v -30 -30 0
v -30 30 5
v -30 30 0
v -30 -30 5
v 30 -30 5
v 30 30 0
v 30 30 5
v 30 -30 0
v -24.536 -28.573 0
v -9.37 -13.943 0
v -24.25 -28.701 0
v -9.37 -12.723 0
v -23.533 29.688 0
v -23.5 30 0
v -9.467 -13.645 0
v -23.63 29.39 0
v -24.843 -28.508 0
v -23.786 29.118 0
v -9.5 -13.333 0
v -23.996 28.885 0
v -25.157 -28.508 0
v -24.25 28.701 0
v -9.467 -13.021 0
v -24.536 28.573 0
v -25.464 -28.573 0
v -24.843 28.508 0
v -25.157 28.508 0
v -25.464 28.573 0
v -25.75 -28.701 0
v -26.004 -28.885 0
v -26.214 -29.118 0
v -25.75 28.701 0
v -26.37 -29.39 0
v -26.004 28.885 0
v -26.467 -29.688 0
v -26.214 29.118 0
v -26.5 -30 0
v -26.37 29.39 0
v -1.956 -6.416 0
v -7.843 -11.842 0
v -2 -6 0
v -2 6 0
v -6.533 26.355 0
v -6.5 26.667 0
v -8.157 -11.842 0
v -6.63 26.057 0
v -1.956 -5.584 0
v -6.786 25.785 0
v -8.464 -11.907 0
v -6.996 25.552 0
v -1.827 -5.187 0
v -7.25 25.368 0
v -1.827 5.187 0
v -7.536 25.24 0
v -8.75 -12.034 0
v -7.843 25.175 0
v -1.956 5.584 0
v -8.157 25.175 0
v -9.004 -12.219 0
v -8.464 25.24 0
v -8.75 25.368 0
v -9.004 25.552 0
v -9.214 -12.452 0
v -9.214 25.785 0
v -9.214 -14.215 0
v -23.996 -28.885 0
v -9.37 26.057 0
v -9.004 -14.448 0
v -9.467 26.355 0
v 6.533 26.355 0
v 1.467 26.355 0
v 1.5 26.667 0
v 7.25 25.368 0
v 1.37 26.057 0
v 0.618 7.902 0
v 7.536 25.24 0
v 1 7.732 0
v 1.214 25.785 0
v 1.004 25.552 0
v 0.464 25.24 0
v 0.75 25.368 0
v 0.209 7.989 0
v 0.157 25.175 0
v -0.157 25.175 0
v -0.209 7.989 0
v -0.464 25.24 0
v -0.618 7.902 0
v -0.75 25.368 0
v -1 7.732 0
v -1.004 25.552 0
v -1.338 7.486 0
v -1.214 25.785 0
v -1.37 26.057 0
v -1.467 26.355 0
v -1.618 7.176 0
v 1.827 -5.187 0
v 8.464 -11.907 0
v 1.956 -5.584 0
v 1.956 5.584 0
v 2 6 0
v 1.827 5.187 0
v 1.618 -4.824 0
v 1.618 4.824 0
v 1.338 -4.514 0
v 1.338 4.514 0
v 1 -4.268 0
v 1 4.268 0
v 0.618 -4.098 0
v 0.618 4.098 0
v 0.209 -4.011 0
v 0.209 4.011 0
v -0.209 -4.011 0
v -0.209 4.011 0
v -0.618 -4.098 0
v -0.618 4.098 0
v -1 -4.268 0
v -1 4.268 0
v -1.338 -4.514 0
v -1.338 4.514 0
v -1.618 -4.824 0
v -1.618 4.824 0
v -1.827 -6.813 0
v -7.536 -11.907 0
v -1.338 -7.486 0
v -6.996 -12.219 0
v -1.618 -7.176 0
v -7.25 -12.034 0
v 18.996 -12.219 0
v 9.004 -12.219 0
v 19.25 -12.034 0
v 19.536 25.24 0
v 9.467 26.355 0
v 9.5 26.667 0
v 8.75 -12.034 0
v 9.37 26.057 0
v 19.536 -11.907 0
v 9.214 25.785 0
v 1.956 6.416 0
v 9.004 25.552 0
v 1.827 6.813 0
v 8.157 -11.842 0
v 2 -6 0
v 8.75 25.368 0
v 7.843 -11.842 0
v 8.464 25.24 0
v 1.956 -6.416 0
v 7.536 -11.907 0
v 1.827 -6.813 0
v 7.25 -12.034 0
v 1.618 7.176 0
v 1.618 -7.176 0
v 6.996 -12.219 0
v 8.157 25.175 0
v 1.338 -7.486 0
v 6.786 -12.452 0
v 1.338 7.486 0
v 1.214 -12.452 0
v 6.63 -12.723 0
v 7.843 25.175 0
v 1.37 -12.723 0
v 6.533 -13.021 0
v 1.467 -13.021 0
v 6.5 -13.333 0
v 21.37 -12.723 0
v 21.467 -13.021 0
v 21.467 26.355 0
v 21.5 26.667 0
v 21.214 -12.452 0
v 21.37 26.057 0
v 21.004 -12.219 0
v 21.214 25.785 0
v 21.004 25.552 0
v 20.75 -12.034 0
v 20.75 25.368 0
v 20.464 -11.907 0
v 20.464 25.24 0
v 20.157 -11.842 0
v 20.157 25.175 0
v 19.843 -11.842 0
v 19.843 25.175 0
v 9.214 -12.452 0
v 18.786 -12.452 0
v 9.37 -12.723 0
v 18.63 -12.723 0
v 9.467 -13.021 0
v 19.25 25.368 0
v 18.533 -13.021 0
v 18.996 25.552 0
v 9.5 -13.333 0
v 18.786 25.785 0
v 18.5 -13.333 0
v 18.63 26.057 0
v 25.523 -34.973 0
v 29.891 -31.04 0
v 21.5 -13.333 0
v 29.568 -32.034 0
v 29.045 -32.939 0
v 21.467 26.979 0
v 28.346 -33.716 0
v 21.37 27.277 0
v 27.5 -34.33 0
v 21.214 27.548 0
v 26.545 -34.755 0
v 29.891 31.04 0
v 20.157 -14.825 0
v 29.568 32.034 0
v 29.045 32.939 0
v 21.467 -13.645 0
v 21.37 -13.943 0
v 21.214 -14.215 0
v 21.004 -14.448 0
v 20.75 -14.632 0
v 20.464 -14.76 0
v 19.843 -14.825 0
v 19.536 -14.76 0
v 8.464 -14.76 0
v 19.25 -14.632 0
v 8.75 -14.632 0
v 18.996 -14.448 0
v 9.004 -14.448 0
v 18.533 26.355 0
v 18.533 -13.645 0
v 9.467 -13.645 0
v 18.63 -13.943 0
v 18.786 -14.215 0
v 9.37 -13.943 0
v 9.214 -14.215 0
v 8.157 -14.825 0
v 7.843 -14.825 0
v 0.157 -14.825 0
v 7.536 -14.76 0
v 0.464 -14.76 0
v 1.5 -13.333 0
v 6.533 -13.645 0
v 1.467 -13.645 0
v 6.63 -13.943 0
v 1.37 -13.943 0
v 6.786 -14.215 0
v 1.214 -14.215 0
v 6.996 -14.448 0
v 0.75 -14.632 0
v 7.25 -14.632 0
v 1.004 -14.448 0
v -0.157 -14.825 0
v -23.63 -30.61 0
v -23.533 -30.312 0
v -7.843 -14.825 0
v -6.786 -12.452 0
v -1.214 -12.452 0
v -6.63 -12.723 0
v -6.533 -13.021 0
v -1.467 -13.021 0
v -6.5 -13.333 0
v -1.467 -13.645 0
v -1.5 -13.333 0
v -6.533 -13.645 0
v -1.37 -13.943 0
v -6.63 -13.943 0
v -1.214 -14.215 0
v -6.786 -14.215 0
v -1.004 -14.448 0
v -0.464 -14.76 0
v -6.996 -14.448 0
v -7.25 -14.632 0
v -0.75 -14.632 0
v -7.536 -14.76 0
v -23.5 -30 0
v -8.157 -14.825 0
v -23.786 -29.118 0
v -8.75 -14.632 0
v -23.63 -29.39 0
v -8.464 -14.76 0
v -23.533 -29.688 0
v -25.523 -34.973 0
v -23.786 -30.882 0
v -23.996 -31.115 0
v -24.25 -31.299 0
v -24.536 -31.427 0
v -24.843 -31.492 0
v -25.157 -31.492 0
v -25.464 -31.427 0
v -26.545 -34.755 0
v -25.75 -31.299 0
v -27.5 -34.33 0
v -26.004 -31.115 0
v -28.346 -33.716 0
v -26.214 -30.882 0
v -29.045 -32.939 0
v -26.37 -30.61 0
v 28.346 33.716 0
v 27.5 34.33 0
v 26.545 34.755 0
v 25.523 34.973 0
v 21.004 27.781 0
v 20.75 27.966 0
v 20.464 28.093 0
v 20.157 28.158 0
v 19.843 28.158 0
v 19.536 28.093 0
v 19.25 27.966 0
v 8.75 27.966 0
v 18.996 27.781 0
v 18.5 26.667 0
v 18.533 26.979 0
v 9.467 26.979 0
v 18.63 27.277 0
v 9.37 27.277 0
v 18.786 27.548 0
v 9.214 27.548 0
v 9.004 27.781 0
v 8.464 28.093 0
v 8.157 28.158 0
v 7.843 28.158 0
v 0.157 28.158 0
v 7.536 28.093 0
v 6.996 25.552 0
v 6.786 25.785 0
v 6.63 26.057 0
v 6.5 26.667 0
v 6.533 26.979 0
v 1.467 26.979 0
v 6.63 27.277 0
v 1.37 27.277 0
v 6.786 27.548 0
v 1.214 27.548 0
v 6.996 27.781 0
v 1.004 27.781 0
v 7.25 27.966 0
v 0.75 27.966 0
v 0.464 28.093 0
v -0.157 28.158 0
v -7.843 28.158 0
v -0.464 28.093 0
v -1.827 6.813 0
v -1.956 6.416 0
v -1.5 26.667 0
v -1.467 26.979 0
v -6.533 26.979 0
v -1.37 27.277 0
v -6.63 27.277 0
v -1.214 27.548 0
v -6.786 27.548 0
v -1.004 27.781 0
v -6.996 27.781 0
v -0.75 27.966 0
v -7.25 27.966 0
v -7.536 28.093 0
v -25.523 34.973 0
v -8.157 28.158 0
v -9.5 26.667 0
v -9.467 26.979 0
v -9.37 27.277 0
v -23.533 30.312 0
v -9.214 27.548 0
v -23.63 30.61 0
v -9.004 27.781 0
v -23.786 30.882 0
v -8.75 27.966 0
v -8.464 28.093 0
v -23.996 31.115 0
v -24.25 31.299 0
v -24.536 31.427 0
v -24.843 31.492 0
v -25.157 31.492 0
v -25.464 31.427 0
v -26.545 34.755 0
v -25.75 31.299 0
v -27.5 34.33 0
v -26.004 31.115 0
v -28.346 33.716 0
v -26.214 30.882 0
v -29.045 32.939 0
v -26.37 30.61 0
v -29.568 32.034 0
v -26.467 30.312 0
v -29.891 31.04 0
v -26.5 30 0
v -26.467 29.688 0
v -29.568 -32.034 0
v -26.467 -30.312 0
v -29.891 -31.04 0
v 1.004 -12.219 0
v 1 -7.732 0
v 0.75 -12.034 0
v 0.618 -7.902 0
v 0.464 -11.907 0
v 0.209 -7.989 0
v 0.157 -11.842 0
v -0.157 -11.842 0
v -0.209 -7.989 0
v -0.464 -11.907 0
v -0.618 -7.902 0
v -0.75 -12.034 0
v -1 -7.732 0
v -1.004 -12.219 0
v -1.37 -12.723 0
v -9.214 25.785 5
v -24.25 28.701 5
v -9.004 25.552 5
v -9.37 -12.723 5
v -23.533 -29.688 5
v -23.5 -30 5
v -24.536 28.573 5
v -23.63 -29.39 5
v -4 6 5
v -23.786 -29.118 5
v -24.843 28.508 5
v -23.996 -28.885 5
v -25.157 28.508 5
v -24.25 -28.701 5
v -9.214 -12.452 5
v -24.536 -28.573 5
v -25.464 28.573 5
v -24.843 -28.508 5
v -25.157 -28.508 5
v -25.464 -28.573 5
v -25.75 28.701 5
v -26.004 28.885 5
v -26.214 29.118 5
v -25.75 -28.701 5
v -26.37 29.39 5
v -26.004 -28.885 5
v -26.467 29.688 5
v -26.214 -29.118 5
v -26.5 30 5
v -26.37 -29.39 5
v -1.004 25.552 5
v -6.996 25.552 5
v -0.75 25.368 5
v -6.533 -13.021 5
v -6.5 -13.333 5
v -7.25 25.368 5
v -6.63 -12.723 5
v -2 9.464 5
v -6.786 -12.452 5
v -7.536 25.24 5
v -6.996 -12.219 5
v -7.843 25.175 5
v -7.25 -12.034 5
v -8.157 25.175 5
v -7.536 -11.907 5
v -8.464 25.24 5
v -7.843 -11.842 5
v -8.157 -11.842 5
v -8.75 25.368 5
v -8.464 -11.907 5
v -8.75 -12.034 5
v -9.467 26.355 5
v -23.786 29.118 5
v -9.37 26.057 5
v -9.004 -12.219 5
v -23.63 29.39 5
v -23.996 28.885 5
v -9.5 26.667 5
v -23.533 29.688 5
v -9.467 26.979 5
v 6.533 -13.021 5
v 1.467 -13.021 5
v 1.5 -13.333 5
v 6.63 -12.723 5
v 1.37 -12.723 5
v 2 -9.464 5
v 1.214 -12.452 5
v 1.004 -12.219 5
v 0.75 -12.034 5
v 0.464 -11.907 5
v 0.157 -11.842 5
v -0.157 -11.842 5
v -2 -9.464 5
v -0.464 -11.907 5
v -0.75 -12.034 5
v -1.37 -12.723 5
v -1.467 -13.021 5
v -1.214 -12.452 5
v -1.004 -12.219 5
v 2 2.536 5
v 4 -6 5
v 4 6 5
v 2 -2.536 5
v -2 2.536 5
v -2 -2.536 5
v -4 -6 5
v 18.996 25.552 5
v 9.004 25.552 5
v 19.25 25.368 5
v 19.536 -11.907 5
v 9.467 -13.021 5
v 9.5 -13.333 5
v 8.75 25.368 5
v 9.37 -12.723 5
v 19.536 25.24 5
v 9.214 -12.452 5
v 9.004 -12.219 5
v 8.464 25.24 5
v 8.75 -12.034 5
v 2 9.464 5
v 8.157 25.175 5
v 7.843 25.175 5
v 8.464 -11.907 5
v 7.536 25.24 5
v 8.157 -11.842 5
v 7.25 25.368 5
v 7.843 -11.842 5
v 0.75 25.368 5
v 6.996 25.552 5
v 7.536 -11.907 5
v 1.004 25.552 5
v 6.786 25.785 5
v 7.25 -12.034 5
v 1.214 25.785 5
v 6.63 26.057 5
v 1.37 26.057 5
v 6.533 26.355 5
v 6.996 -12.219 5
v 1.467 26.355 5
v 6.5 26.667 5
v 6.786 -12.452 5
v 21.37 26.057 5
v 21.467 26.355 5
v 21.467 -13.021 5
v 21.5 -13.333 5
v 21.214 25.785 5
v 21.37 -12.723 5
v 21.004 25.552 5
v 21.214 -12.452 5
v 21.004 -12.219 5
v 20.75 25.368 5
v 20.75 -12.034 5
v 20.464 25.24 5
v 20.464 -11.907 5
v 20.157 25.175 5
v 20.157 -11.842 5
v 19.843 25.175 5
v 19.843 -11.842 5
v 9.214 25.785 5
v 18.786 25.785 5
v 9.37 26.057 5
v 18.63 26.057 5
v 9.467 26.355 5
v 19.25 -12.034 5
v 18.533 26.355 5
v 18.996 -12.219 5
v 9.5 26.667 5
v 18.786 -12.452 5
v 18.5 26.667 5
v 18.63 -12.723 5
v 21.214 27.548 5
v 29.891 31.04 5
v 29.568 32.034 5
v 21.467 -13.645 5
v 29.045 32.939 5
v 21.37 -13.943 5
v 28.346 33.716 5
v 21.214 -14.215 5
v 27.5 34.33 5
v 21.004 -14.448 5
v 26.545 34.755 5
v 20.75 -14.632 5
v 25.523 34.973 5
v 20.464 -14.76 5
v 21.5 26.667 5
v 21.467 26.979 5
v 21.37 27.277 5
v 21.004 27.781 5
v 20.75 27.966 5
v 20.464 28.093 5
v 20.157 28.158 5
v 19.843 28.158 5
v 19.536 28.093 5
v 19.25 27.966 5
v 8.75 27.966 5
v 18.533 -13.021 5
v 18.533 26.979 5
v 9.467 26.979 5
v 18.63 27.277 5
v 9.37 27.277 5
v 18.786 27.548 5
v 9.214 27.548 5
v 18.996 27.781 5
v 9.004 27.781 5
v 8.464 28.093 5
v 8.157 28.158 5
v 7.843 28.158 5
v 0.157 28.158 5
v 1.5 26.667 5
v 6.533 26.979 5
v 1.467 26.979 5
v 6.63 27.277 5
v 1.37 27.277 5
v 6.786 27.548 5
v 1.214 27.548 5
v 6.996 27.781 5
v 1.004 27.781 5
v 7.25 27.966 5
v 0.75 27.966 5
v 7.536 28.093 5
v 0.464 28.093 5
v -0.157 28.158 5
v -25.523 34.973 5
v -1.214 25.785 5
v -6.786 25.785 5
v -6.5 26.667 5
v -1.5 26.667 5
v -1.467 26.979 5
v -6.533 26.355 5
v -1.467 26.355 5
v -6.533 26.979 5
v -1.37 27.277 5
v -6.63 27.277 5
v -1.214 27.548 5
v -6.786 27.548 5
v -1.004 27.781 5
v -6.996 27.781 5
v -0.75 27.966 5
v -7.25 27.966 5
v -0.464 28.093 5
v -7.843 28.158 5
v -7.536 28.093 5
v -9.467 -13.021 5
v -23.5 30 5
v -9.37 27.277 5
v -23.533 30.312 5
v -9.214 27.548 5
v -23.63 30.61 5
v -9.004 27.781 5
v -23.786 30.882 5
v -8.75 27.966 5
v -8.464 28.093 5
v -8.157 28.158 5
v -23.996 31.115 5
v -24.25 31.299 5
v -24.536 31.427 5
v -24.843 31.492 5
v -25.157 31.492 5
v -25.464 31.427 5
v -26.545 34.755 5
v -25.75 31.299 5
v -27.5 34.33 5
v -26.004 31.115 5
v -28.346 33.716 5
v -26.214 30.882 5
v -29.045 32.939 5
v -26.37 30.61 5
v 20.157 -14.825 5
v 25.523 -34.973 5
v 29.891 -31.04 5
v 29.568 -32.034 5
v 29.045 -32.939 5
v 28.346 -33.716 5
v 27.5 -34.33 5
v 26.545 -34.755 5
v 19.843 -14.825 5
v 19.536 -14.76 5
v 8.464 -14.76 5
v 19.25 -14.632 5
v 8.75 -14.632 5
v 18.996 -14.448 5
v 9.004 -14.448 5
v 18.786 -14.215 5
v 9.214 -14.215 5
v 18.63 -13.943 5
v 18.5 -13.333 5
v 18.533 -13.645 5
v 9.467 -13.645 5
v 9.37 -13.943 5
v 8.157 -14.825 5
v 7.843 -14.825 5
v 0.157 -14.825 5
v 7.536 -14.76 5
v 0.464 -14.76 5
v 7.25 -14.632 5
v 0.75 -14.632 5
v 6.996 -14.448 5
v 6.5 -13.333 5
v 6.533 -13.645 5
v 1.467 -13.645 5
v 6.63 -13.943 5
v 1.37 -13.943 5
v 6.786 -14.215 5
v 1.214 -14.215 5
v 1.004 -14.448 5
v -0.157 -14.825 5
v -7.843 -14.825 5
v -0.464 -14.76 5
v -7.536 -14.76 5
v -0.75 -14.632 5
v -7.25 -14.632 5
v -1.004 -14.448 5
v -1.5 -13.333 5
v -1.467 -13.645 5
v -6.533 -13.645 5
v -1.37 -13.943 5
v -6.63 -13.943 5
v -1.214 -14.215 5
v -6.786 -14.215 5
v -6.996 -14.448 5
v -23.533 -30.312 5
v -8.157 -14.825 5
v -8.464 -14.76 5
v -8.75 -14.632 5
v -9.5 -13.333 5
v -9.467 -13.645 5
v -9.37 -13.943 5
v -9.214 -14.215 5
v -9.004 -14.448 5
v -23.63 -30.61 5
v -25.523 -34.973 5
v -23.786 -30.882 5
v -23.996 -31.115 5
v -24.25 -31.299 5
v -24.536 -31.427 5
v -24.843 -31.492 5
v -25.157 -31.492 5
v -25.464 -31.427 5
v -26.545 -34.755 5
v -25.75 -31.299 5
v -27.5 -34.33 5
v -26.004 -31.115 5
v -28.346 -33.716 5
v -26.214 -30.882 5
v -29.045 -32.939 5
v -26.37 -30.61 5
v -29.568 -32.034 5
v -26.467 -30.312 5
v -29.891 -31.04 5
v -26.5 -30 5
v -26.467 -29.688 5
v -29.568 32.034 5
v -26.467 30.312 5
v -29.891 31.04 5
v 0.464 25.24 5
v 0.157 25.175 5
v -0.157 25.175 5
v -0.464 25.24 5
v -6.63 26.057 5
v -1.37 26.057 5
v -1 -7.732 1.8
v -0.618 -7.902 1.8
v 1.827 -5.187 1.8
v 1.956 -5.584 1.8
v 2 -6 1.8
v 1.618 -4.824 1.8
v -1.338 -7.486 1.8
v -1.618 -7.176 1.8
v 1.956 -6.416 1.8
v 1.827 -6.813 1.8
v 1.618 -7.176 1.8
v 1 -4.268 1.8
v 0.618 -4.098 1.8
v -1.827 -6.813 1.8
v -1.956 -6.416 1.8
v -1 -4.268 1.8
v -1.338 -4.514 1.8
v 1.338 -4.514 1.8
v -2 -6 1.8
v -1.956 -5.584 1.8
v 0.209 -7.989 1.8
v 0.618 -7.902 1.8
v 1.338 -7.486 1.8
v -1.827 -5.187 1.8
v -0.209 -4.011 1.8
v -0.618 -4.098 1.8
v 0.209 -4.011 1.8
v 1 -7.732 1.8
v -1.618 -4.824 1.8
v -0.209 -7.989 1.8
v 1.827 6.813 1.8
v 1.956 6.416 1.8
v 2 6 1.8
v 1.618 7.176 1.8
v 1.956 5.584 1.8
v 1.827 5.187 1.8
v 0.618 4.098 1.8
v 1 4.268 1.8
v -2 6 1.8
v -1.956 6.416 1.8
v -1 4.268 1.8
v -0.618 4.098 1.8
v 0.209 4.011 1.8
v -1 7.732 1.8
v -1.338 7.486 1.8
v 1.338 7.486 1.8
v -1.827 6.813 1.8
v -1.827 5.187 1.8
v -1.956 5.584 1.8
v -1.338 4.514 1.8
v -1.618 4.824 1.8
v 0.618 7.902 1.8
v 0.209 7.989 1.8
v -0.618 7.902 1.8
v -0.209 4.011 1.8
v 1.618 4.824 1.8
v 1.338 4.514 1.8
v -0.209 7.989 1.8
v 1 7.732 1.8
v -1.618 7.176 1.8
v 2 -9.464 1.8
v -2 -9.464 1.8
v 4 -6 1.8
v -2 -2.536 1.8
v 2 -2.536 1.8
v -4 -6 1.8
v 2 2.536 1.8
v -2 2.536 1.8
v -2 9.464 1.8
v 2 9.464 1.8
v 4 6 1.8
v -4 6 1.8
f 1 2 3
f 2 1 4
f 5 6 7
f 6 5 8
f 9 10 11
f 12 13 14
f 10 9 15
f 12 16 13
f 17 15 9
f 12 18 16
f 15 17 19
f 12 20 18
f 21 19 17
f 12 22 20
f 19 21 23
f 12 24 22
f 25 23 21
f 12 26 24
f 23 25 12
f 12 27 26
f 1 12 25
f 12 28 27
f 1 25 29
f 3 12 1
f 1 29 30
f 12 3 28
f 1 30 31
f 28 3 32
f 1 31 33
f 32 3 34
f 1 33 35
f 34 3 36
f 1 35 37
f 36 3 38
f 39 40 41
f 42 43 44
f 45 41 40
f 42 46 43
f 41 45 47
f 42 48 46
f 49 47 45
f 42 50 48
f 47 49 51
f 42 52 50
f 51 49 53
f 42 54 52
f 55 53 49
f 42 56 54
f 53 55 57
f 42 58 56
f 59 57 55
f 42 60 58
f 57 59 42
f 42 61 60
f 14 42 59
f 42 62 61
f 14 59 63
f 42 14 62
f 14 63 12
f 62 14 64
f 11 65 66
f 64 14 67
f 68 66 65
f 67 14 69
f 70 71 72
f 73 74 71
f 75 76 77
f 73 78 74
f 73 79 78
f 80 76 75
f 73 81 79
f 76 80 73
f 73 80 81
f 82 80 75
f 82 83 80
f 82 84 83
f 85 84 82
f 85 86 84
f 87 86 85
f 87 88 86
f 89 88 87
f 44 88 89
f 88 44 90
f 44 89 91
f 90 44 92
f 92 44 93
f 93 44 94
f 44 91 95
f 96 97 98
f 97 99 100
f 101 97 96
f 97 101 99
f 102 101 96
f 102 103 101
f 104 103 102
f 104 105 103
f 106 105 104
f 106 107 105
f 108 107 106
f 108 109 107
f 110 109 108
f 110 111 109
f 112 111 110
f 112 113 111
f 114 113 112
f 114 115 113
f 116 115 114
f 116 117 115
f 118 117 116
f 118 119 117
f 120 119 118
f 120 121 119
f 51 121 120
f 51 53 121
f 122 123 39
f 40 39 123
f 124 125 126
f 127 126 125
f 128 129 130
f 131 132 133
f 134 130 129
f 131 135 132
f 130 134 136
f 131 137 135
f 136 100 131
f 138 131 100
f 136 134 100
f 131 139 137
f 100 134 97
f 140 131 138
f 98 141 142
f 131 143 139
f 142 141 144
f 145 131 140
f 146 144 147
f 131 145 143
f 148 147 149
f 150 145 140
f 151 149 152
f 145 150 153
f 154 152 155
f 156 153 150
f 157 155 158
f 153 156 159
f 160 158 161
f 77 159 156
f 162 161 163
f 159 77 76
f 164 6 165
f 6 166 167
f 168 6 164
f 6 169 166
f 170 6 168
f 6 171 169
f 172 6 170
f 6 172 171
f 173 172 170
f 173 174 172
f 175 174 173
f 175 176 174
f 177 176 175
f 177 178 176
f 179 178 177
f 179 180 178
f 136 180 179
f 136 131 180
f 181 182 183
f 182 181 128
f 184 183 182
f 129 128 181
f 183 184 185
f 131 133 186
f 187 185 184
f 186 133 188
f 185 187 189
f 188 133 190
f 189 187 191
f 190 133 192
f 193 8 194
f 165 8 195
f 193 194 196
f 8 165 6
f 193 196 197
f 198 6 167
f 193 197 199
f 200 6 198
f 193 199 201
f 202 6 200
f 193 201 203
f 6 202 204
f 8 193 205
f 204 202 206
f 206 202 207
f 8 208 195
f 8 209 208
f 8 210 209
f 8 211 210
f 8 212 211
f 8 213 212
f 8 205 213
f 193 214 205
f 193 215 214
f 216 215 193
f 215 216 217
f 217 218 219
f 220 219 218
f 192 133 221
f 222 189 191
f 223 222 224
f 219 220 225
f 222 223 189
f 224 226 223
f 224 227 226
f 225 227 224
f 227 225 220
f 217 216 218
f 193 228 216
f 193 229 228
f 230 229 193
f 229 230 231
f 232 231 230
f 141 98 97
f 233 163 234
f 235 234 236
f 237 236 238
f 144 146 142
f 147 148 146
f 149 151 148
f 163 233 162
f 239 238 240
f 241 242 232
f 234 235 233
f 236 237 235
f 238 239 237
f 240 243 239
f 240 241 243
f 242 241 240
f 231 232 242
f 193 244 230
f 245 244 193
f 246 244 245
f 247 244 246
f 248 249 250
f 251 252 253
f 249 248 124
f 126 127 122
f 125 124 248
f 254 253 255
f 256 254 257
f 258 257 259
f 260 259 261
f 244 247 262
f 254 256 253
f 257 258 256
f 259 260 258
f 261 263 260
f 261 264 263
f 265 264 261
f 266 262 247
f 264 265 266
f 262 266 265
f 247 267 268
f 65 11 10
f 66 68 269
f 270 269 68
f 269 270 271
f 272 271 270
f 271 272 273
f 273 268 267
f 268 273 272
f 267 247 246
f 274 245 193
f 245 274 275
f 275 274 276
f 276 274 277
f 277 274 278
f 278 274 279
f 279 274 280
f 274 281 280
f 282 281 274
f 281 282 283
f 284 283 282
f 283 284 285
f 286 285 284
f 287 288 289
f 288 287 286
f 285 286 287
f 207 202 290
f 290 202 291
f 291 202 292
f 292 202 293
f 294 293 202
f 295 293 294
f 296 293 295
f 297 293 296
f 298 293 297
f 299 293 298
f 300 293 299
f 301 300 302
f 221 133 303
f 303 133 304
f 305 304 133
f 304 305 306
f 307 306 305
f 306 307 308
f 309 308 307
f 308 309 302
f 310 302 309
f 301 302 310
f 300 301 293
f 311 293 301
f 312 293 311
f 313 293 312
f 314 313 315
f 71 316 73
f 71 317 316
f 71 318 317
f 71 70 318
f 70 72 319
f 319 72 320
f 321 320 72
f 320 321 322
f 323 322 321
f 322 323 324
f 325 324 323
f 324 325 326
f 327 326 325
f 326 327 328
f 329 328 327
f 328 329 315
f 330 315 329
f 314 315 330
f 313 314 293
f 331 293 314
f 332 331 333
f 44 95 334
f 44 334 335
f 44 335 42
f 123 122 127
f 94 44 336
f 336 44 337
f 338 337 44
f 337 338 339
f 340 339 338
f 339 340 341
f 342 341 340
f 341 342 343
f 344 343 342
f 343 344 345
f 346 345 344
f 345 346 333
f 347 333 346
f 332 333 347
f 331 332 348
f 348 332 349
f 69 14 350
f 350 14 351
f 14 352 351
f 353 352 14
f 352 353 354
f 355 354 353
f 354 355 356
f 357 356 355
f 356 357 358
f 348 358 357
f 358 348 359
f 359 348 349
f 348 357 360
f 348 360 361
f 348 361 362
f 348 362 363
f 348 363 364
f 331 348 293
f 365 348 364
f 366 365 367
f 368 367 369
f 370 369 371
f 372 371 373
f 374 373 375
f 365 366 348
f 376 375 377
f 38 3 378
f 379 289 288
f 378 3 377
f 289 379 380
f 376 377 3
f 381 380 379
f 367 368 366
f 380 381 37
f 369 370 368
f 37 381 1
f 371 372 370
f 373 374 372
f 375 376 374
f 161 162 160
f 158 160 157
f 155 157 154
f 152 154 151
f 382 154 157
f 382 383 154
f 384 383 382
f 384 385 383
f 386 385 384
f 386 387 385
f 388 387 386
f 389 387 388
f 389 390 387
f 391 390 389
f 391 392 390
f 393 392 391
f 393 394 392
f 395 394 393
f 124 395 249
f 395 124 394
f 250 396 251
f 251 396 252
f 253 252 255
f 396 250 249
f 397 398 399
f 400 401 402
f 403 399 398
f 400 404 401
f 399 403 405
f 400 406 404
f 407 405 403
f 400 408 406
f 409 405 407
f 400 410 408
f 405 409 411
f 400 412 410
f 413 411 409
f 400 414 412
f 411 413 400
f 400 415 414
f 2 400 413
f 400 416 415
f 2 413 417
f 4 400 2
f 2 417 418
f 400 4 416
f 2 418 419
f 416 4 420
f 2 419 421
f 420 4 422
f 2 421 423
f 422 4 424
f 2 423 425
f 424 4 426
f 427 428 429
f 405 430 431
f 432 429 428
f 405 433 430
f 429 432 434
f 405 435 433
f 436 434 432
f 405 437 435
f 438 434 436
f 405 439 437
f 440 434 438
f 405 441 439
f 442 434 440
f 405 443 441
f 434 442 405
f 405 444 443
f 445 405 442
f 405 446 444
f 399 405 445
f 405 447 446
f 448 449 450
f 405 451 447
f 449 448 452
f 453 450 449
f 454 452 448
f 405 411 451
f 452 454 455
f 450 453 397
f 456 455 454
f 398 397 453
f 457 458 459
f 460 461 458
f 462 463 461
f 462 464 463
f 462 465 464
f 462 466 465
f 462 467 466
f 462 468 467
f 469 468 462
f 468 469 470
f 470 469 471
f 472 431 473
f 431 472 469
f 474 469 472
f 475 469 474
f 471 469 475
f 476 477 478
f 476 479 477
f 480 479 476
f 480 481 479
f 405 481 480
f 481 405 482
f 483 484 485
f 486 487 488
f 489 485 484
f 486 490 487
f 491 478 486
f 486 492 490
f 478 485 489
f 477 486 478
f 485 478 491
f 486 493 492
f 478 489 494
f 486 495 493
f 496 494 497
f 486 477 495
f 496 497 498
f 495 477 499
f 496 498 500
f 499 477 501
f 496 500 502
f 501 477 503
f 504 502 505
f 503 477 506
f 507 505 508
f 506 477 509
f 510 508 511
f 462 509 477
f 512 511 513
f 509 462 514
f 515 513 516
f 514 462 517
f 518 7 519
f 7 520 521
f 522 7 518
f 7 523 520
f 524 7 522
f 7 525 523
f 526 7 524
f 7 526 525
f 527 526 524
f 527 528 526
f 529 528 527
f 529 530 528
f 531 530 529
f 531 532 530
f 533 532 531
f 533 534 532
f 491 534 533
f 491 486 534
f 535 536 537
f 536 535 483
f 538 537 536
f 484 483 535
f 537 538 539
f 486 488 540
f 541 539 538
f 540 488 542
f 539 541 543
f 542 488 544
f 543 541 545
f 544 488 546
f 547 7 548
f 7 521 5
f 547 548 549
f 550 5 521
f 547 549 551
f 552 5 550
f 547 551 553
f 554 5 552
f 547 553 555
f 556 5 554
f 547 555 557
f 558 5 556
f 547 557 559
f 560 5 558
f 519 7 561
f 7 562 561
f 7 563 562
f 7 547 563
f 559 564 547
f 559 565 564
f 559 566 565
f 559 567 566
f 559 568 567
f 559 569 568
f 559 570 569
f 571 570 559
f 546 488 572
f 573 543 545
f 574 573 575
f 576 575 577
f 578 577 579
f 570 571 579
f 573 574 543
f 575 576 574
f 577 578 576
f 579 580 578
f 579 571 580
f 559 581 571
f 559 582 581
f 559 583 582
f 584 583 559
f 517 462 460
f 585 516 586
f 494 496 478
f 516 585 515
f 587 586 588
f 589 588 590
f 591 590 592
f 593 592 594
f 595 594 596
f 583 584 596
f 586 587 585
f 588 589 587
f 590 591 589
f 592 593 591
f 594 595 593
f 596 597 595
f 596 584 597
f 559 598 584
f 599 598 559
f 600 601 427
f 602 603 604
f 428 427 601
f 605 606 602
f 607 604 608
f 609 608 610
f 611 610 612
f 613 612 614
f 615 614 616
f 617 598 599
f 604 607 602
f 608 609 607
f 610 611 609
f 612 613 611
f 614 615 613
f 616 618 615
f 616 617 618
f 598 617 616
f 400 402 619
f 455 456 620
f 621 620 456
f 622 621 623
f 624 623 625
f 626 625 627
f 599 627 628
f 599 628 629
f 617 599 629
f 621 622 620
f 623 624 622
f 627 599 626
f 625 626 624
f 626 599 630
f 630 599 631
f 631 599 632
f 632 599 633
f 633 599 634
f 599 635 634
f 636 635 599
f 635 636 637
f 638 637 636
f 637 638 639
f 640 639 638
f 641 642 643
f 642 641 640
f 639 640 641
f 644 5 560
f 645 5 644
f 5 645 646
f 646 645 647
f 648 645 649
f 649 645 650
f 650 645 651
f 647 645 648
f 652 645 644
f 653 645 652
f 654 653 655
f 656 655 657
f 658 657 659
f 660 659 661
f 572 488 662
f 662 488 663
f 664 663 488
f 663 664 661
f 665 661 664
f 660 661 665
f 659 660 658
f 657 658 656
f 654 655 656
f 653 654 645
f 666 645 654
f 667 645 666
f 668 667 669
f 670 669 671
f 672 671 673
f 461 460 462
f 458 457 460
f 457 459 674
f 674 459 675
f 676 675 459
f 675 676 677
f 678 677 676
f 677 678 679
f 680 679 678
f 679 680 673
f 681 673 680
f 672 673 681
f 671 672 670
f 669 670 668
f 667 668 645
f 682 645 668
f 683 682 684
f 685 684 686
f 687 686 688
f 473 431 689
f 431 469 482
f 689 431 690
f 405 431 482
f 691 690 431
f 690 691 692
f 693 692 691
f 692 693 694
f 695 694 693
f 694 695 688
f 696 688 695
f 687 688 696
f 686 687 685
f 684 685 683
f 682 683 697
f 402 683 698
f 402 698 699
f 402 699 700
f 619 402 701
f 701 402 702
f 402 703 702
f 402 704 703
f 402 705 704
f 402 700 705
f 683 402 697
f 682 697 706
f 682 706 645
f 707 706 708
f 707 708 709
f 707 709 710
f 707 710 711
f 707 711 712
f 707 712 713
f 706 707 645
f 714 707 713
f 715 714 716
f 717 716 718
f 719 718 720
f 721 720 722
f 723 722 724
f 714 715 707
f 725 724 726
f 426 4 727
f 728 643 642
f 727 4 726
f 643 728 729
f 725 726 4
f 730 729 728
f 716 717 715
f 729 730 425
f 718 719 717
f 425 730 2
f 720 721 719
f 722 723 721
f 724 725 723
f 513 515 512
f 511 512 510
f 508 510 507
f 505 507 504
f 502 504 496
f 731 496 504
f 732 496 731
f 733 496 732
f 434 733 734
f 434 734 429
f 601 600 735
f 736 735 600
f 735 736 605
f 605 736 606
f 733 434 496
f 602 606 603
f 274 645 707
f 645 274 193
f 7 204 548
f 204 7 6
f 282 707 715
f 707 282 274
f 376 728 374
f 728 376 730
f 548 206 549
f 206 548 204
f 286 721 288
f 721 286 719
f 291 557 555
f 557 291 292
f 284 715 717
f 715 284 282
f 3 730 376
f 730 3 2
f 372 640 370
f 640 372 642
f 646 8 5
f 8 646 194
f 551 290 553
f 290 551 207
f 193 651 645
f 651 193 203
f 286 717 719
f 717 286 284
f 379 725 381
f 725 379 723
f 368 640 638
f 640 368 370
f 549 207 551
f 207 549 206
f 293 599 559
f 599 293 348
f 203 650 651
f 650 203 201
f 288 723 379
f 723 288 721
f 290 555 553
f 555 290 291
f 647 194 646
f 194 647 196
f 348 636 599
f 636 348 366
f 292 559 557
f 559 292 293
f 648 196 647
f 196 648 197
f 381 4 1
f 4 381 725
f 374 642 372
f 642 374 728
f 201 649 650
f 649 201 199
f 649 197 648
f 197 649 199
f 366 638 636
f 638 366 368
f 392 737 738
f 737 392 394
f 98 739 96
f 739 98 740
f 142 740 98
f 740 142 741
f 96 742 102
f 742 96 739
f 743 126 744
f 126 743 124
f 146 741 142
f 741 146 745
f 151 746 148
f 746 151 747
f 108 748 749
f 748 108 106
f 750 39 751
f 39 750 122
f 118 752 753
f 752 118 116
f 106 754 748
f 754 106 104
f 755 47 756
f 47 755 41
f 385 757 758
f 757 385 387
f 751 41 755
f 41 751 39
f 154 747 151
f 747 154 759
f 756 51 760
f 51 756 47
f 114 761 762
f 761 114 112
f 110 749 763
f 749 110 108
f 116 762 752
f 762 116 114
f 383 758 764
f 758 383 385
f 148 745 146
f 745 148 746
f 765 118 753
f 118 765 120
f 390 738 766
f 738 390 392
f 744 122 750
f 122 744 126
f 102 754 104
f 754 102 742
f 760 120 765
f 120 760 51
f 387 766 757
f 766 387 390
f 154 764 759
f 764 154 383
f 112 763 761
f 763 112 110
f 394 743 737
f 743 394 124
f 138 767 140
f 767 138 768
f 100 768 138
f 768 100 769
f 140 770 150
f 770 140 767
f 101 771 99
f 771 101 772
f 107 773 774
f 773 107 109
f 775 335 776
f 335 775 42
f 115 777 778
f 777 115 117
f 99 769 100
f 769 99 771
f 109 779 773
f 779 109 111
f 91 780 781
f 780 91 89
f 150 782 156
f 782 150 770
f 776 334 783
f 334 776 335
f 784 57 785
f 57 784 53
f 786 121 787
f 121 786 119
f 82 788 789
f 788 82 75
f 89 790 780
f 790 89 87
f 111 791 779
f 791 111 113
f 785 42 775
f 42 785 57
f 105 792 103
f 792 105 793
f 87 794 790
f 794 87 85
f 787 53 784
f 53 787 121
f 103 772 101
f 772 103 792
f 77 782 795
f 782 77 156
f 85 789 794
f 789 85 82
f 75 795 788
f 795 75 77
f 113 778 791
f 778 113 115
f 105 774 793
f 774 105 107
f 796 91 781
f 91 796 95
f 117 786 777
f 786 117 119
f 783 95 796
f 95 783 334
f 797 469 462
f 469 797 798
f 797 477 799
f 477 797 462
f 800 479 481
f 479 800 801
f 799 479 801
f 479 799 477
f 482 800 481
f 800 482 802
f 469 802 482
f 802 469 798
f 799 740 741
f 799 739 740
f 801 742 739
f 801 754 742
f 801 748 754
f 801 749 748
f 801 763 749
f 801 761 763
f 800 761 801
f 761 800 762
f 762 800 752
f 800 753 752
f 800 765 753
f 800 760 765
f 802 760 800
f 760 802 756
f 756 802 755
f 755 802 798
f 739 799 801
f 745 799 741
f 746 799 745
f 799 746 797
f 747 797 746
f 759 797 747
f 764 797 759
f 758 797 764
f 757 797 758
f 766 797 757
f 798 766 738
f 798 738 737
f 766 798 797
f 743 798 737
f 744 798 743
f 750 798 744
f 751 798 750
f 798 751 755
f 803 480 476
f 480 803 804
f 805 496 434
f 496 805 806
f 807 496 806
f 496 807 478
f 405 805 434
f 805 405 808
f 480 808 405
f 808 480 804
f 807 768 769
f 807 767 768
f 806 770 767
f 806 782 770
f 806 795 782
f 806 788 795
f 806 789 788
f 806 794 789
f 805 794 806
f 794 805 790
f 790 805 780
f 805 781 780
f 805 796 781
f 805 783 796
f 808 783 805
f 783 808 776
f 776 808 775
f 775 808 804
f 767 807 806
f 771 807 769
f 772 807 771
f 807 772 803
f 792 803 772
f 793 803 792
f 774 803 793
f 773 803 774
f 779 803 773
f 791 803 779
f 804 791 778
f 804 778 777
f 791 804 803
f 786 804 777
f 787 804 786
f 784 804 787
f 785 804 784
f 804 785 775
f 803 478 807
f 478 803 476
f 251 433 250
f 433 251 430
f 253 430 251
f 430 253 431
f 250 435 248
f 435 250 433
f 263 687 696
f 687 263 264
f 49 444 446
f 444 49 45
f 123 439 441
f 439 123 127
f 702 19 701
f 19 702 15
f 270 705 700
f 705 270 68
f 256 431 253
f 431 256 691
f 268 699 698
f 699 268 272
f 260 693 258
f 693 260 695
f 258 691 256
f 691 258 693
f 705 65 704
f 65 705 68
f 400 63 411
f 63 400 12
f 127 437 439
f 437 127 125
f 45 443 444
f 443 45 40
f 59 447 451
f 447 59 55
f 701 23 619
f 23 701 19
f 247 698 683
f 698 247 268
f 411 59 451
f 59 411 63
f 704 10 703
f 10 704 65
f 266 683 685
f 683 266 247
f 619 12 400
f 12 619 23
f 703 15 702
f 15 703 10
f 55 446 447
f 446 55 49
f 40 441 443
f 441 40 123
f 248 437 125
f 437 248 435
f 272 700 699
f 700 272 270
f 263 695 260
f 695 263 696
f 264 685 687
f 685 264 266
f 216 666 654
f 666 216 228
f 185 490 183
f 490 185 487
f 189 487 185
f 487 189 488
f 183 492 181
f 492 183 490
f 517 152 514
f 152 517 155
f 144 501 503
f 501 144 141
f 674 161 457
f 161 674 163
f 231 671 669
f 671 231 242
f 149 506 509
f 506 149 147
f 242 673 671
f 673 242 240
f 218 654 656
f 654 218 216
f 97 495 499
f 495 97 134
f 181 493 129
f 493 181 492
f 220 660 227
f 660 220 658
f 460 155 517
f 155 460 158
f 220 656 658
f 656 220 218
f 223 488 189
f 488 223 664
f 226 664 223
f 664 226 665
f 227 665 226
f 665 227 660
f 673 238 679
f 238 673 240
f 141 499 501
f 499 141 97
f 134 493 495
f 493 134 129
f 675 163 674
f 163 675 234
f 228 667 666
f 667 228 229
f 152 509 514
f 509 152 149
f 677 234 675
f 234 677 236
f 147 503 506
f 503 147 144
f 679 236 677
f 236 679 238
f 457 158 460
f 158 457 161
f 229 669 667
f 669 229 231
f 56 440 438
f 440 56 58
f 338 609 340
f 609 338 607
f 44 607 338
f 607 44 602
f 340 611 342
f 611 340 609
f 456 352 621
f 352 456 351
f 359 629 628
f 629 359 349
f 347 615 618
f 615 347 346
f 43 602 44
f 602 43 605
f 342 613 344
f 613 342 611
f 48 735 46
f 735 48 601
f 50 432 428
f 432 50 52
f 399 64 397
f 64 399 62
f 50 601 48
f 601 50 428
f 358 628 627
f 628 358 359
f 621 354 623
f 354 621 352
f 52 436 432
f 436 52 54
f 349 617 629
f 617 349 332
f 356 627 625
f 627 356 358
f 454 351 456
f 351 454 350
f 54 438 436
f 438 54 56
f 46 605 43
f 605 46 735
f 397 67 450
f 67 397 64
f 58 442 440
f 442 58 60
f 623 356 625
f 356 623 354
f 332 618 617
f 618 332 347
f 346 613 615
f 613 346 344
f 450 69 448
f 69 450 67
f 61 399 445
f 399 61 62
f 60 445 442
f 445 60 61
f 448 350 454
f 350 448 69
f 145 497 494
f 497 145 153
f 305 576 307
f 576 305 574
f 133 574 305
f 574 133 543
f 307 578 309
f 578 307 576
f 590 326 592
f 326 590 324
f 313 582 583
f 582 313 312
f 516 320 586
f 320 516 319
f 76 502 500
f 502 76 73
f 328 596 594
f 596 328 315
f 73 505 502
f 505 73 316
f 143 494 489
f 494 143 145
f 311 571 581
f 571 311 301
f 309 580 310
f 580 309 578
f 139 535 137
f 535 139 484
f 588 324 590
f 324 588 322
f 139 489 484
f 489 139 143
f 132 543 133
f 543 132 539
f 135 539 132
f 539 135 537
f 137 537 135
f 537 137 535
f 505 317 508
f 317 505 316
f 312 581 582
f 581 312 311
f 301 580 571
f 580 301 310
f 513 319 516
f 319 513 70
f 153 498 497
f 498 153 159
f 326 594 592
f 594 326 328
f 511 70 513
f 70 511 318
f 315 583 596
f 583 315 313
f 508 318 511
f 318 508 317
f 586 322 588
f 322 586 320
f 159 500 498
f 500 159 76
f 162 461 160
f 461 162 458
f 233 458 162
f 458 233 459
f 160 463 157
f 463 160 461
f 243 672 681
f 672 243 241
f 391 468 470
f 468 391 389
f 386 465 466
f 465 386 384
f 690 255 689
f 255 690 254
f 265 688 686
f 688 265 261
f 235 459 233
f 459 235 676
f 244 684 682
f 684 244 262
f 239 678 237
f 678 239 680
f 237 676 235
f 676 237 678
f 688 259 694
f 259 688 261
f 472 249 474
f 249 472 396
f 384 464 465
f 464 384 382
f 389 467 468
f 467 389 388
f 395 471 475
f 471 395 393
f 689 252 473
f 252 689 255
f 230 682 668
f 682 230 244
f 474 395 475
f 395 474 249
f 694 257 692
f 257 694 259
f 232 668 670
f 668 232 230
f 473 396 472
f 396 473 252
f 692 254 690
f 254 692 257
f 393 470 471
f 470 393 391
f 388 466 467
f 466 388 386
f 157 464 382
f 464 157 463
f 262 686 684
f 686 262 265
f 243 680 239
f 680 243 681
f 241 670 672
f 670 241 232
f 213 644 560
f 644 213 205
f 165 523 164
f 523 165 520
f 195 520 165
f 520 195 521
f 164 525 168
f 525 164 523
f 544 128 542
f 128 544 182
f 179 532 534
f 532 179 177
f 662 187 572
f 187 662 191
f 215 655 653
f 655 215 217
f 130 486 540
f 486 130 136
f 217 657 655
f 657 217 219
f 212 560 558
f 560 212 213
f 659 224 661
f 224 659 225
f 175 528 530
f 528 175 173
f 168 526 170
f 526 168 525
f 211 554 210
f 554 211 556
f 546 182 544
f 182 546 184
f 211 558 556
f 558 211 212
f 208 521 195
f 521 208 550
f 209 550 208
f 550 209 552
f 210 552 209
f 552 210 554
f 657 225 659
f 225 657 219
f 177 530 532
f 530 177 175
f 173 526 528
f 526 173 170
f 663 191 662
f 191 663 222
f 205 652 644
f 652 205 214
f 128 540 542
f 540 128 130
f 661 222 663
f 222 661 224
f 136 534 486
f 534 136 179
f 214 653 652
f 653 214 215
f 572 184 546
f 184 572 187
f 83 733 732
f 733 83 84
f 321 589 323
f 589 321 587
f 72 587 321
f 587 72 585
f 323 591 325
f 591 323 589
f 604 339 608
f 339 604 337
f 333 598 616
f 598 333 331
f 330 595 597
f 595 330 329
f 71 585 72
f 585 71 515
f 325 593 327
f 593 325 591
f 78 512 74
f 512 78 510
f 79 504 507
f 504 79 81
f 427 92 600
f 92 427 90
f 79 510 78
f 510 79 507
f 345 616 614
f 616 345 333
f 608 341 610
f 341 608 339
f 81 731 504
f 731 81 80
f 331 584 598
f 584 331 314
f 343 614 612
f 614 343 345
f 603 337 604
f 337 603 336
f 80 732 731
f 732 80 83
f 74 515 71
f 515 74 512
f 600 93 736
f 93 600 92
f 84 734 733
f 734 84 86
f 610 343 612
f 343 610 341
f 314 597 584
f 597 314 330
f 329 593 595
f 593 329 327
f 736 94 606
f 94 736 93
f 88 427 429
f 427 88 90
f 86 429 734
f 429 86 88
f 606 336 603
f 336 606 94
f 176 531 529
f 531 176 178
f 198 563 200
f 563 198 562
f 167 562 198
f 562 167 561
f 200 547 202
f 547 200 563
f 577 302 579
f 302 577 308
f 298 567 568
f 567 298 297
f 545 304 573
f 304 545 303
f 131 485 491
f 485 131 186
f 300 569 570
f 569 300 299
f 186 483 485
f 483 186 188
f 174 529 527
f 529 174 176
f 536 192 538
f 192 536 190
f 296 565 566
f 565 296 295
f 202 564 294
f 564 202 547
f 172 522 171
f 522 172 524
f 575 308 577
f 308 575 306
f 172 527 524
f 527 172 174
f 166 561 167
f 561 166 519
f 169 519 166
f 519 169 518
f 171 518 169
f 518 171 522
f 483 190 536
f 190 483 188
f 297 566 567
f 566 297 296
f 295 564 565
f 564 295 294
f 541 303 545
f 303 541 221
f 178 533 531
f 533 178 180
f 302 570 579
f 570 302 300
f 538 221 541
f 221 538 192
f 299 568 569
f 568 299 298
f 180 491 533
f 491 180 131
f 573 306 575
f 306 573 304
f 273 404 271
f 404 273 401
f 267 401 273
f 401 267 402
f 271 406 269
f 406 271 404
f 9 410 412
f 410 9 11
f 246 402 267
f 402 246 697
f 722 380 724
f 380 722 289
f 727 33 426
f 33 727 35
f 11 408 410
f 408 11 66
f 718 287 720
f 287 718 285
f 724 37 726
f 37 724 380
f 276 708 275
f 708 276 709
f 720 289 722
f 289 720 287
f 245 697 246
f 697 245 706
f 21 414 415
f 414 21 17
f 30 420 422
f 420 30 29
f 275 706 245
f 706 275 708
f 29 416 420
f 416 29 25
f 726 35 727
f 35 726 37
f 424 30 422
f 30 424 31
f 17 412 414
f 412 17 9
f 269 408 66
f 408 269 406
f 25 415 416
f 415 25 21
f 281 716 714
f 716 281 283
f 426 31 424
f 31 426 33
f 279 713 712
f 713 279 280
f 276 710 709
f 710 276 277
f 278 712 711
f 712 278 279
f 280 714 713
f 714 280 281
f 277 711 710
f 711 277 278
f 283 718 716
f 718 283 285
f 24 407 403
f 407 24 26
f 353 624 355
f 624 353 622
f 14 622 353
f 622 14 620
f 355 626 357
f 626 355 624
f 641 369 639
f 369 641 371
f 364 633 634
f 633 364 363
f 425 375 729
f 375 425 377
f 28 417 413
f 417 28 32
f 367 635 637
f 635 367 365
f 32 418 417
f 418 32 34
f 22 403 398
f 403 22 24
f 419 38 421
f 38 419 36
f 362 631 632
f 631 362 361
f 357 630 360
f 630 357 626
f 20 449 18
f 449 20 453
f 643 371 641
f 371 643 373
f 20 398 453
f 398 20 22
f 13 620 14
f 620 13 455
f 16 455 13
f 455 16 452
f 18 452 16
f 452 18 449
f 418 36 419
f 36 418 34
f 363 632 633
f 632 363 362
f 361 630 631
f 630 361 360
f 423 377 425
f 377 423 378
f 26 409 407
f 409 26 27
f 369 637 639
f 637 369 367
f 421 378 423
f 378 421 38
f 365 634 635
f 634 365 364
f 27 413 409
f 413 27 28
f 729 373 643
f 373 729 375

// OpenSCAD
WIDTH = 60;
HEIGHT = 70;
THICKNESS = 5;
CORNER_DIA = 10;

PLATE_MOUNT_HEIGHT = 12;
PLATE_MOUNT_DIA = 4;
PLATE_MOUNT_NUT_DIA = 8;
PLATE_MOUNT_NUT_HEIGHT = 3.2;

MOUNT_DIA = 3;
MOUNT_HEIGHT_1 = 40;
MOUNT_WIDTH_1 = 16;
MOUNT_HEIGHT_2 = 60;
MOUNT_WIDTH_2 = 20;

$fn = 30;

module rounded_cube(width, height, thickness, corner_dia) {
    hull() {
        for(i = [-1, 1]) {
            for(j = [-1, 1]) {
                translate([i * (width - corner_dia)/2, j * (height - corner_dia)/2, 0])
                cylinder(d = corner_dia, h = thickness);
            }
        }
    }       
}

module mounting_holes(dia, width, height, thickness, three = false, two = false) {
    union() {
        for(j = [-1, 1]) {
            for(i = (three && j == -1) || two ? [0] : [-1, 1]) {
                translate([i * width/2, j * height/2, 0])
                cylinder(d = dia, h = thickness);
            }
        }
    }
}

module plate() {
    rounded_cube(WIDTH, HEIGHT, THICKNESS, CORNER_DIA);
}

module mount_pos() {
    w = max(MOUNT_WIDTH_1, MOUNT_WIDTH_2)+MOUNT_DIA*2;
    rounded_cube(WIDTH, MOUNT_HEIGHT_1+MOUNT_DIA*2, THICKNESS, CORNER_DIA);

    rounded_cube(WIDTH, MOUNT_HEIGHT_2+MOUNT_DIA*2, THICKNESS, CORNER_DIA);
}

module mount_neg() {
    translate([0, abs(MOUNT_HEIGHT_1-MOUNT_HEIGHT_2)/3, 0])
    mounting_holes(MOUNT_DIA, MOUNT_WIDTH_1, MOUNT_HEIGHT_1, THICKNESS);

    translate([MOUNT_WIDTH_2/2, abs(MOUNT_HEIGHT_1-MOUNT_HEIGHT_2)/3, 0])
    mounting_holes(MOUNT_DIA, MOUNT_WIDTH_2, MOUNT_HEIGHT_1, THICKNESS);

    translate([-(WIDTH - CORNER_DIA)/2, 0, 0])
    mounting_holes(MOUNT_DIA, MOUNT_WIDTH_2, MOUNT_HEIGHT_2, THICKNESS, two = true);
}


module plate_mount_neg() {
    mounting_holes(PLATE_MOUNT_DIA, 0, PLATE_MOUNT_HEIGHT, THICKNESS, two = true);
    translate([0, 0, THICKNESS-PLATE_MOUNT_NUT_HEIGHT]) {
        $fn = 6;
        mounting_holes(PLATE_MOUNT_NUT_DIA, 0, PLATE_MOUNT_HEIGHT, THICKNESS, two = true);
    }
}

difference() {
    union() {
        plate();
        mount_pos();
    }
    plate_mount_neg();
    mount_neg();
}
